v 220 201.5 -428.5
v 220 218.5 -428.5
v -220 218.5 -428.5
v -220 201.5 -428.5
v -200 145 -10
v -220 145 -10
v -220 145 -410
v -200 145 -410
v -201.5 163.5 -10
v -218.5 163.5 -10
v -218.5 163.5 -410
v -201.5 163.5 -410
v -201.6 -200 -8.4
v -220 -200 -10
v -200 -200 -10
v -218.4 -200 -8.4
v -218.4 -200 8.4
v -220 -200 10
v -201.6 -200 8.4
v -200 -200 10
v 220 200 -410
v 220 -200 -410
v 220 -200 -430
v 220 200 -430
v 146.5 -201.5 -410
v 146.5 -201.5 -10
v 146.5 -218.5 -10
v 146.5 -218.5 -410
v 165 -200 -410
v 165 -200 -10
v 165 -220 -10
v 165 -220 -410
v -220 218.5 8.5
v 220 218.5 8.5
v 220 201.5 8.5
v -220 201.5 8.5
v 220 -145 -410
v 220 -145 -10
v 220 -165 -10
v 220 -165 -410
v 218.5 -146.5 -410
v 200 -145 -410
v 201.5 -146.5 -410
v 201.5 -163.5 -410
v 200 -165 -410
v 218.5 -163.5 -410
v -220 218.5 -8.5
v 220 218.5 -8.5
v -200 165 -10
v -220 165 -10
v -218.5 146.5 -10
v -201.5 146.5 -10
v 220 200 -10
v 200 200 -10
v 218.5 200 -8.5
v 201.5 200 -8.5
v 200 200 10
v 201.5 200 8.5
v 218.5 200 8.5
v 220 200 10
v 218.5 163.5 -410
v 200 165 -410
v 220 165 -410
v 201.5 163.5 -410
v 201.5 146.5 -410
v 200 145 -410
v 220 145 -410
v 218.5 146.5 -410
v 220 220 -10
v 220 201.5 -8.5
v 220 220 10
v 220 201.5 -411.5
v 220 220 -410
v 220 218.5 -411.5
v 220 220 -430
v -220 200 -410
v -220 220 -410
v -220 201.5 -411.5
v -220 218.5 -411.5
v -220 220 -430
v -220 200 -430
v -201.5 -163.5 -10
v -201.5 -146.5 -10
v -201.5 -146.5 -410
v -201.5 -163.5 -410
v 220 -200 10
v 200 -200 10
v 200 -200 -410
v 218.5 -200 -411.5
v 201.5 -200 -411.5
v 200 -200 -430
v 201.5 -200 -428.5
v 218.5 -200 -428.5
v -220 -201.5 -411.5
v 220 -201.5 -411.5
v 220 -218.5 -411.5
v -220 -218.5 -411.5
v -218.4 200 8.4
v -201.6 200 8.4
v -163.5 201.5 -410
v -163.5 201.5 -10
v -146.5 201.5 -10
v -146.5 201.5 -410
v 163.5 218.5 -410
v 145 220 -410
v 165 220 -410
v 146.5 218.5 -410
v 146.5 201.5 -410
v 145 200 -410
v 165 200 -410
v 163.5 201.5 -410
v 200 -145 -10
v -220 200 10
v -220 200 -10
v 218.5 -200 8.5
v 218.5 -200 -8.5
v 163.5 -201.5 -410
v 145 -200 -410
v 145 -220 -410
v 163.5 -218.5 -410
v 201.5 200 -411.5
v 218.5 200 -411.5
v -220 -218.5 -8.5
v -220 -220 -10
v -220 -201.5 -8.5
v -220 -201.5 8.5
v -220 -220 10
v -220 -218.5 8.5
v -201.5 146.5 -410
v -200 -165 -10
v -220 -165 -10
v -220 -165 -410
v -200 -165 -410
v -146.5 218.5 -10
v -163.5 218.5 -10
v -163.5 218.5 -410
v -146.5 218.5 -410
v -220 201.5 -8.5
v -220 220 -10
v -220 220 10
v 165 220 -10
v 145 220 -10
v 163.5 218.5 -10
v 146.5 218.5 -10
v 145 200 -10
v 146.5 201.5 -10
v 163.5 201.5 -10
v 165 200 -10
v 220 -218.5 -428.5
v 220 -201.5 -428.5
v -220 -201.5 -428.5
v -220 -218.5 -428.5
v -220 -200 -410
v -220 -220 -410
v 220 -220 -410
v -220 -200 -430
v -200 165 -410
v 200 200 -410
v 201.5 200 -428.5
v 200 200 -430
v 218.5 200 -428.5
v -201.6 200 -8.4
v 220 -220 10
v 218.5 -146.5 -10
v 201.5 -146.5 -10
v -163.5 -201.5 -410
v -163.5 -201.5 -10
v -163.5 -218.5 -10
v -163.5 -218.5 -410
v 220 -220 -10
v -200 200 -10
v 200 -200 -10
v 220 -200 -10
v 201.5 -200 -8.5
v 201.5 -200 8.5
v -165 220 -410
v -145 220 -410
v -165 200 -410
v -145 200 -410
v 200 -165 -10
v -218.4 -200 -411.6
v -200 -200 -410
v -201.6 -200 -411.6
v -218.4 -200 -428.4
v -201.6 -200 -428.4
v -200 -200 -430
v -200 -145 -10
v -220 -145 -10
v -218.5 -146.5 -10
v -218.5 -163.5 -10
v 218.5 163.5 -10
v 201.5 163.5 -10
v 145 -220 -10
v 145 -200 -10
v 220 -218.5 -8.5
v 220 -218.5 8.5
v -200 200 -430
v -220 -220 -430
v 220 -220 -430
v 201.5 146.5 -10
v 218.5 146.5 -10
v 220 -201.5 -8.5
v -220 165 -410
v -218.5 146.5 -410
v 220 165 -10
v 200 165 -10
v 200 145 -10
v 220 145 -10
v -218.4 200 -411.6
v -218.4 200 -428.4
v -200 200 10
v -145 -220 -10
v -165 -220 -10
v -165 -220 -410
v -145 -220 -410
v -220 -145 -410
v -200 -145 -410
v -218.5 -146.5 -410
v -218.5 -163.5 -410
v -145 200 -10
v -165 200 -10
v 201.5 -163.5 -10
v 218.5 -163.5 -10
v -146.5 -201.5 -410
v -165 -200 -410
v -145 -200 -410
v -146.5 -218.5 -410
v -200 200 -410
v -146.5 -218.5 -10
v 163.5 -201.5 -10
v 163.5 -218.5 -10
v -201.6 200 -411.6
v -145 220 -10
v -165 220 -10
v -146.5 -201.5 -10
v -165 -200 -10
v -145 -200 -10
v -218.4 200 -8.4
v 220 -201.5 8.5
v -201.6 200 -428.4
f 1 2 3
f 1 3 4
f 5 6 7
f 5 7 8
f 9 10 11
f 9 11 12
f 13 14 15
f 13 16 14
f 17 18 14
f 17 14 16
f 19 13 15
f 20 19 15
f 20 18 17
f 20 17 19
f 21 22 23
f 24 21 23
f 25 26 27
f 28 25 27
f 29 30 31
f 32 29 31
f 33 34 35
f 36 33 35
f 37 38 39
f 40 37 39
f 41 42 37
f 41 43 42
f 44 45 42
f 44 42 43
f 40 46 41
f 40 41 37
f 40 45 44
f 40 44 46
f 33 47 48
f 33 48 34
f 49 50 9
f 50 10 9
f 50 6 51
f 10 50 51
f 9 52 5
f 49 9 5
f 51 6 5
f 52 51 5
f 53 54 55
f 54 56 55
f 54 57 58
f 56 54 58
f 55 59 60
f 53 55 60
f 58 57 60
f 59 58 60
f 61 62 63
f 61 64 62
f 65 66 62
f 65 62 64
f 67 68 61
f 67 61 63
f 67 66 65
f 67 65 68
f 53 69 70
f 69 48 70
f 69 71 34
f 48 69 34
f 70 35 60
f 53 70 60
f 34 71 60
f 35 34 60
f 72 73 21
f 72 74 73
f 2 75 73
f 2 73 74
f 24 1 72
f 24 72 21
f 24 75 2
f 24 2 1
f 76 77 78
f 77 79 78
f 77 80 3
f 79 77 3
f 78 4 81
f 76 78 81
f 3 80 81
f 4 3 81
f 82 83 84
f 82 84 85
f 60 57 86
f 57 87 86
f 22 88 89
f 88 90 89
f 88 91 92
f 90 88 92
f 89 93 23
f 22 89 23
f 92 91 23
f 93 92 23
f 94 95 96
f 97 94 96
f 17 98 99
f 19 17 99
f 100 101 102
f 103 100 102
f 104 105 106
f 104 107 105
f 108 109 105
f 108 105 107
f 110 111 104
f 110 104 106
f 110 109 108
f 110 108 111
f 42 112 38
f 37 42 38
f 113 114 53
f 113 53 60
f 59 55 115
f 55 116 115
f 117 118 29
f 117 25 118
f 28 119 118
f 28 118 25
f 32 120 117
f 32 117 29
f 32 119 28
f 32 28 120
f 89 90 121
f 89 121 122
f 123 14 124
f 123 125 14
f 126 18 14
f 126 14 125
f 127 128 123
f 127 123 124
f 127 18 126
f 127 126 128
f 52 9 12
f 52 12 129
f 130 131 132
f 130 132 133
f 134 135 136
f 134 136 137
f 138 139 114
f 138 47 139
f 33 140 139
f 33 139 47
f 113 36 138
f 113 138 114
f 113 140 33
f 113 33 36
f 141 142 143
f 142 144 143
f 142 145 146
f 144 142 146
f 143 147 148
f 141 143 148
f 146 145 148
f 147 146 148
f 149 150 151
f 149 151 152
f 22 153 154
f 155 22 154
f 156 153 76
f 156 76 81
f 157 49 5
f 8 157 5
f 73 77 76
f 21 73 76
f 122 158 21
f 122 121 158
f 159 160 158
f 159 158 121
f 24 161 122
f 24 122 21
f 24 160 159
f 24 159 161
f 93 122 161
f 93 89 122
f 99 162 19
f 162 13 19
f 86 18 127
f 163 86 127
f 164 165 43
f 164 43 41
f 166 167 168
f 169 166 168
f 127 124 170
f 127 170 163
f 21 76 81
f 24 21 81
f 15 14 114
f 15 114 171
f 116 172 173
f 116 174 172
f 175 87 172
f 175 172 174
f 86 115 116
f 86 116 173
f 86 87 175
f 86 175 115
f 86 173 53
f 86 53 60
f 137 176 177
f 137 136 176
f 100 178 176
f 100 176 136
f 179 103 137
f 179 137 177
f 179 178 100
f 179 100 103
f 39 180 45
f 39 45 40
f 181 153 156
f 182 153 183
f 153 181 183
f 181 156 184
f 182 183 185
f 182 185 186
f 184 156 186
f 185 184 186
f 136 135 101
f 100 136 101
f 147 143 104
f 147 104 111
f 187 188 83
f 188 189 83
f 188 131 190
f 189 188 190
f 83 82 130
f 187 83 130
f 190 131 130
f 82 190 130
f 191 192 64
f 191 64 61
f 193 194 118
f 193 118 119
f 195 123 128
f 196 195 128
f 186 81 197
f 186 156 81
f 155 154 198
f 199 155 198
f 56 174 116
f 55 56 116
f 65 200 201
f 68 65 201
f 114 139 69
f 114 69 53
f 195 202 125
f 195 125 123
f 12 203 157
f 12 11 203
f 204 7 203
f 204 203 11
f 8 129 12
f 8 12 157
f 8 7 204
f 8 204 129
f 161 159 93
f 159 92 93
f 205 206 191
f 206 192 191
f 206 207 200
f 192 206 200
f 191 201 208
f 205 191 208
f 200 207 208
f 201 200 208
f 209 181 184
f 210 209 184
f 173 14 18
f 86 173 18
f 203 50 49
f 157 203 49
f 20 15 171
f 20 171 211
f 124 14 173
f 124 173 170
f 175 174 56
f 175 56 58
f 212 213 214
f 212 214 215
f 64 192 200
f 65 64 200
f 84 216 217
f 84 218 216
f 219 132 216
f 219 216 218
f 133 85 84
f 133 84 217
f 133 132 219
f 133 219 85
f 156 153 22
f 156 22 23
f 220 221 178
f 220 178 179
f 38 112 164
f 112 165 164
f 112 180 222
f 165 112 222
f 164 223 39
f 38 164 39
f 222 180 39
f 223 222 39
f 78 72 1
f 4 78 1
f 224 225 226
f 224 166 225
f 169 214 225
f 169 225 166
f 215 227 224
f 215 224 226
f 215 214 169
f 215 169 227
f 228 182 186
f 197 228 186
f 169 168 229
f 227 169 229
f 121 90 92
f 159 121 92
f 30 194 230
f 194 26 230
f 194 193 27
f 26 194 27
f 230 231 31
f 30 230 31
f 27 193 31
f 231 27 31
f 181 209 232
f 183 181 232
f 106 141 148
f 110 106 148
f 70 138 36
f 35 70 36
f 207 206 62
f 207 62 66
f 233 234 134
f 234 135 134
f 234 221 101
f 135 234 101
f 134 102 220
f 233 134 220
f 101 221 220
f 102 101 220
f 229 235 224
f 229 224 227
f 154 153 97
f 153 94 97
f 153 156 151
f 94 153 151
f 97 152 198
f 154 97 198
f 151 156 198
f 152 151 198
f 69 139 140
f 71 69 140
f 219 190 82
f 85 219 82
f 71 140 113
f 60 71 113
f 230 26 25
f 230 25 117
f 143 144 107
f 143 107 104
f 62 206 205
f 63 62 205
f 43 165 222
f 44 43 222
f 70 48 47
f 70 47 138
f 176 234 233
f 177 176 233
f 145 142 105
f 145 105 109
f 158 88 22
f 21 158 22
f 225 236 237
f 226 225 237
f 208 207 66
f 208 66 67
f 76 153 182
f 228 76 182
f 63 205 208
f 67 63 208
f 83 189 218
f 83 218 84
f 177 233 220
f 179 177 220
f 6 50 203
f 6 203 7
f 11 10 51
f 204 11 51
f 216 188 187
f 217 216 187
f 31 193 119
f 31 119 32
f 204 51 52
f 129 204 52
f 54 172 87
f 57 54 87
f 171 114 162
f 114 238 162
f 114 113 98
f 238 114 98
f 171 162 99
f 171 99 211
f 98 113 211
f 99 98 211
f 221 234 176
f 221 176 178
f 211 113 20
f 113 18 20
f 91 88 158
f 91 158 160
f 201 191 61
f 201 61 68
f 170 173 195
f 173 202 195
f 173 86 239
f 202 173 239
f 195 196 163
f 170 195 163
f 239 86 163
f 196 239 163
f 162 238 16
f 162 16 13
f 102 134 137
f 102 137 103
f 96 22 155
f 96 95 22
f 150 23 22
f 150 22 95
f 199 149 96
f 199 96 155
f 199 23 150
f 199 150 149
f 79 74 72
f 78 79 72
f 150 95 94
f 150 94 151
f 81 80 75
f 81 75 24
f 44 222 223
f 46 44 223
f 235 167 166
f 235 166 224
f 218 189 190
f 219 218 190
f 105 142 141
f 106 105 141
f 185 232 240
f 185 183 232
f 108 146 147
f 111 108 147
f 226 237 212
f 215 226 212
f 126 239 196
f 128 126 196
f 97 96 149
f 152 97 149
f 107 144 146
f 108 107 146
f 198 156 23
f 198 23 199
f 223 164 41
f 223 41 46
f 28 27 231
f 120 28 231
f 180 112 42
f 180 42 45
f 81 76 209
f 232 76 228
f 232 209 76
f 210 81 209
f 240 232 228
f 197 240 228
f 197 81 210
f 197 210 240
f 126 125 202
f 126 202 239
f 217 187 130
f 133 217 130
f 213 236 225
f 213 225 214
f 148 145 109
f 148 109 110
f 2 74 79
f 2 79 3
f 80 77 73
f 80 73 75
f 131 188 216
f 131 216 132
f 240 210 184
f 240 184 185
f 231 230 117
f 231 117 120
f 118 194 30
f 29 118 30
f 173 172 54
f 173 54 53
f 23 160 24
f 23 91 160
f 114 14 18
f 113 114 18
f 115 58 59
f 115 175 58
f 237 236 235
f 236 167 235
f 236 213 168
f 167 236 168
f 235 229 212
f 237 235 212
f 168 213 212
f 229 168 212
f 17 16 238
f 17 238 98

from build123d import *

# Parameters (mm, degrees)
F0_W     = 20
F0_H     = 20
F0_W_2   = 16.799999401
F0_H_2   = 16.799999401
F1_DEPTH = 200
F0_W_3   = 17
F0_H_3   = 17
F3_W     = 20
F3_H     = 20
F3_W_2   = 17
F3_H_2   = 17
F4_DEPTH = 440
F5_W     = 20
F5_H     = 20
F5_W_2   = 17
F5_H_2   = 17
F6_DEPTH = 400


with BuildPart() as f1:
    # F0 (on Front) → F1 (new body, symmetric)
    with BuildSketch(Plane.XZ):
        with Locations((-210, 0)):
            Rectangle(F0_W, F0_H)
        with Locations((-210, 0)):
            Rectangle(F0_W_2, F0_H_2, mode=Mode.SUBTRACT)
    extrude(amount=F1_DEPTH, both=True)


with BuildPart() as f1b:
    # F0 (on Front) → F1, piece 2 (new body, symmetric)
    with BuildSketch(Plane.XZ):
        with Locations((210, 0)):
            Rectangle(F0_W, F0_H)
        with Locations((210, 0)):
            Rectangle(F0_W_3, F0_H_3, mode=Mode.SUBTRACT)
    extrude(amount=F1_DEPTH, both=True)


with BuildPart() as f4:
    # F3 (on face) → F4 (new body, through all)
    with BuildSketch(Plane(origin=(-220, 0, 0), x_dir=(0, -1, 0), z_dir=(-1, 0, 0))):
        with Locations((-210, 0)):
            Rectangle(F3_W, F3_H)
        with Locations((-210, 0)):
            Rectangle(F3_W_2, F3_H_2, mode=Mode.SUBTRACT)
    extrude(amount=-F4_DEPTH)


with BuildPart() as f4b:
    # F3 (on face) → F4, piece 2 (new body, through all)
    with BuildSketch(Plane(origin=(-220, 0, 0), x_dir=(0, -1, 0), z_dir=(-1, 0, 0))):
        with Locations((210, 0)):
            Rectangle(F3_W, F3_H)
        with Locations((210, 0)):
            Rectangle(F3_W_2, F3_H_2, mode=Mode.SUBTRACT)
    extrude(amount=-F4_DEPTH)


with BuildPart() as f6:
    # F5 (on face) → F6 (new body)
    with BuildSketch(Plane(origin=(0, 0, -10), x_dir=(1, 0, 0), z_dir=(0, 0, -1))):
        with Locations((-155, 210)):
            Rectangle(F5_W, F5_H)
        with Locations((-155, 210)):
            Rectangle(F5_W_2, F5_H_2, mode=Mode.SUBTRACT)
    extrude(amount=F6_DEPTH)


with BuildPart() as f6b:
    # F5 (on face) → F6, piece 2 (new body)
    with BuildSketch(Plane(origin=(0, 0, -10), x_dir=(1, 0, 0), z_dir=(0, 0, -1))):
        with Locations((155, 210)):
            Rectangle(F5_W, F5_H)
        with Locations((155, 210)):
            Rectangle(F5_W_2, F5_H_2, mode=Mode.SUBTRACT)
    extrude(amount=F6_DEPTH)


with BuildPart() as f6c:
    # F5 (on face) → F6, piece 3 (new body)
    with BuildSketch(Plane(origin=(0, 0, -10), x_dir=(1, 0, 0), z_dir=(0, 0, -1))):
        with Locations((-155, -210)):
            Rectangle(F5_W, F5_H)
        with Locations((-155, -210)):
            Rectangle(F5_W_2, F5_H_2, mode=Mode.SUBTRACT)
    extrude(amount=F6_DEPTH)


with BuildPart() as f6d:
    # F5 (on face) → F6, piece 4 (new body)
    with BuildSketch(Plane(origin=(0, 0, -10), x_dir=(1, 0, 0), z_dir=(0, 0, -1))):
        with Locations((155, -210)):
            Rectangle(F5_W, F5_H)
        with Locations((155, -210)):
            Rectangle(F5_W_2, F5_H_2, mode=Mode.SUBTRACT)
    extrude(amount=F6_DEPTH)


with BuildPart() as f6e:
    # F5 (on face) → F6, piece 5 (new body)
    with BuildSketch(Plane(origin=(0, 0, -10), x_dir=(1, 0, 0), z_dir=(0, 0, -1))):
        with Locations((-210, 155)):
            Rectangle(F5_W, F5_H)
        with Locations((-210, 155)):
            Rectangle(F5_W_2, F5_H_2, mode=Mode.SUBTRACT)
    extrude(amount=F6_DEPTH)


with BuildPart() as f6f:
    # F5 (on face) → F6, piece 6 (new body)
    with BuildSketch(Plane(origin=(0, 0, -10), x_dir=(1, 0, 0), z_dir=(0, 0, -1))):
        with Locations((-210, -155)):
            Rectangle(F5_W, F5_H)
        with Locations((-210, -155)):
            Rectangle(F5_W_2, F5_H_2, mode=Mode.SUBTRACT)
    extrude(amount=F6_DEPTH)


with BuildPart() as f6g:
    # F5 (on face) → F6, piece 7 (new body)
    with BuildSketch(Plane(origin=(0, 0, -10), x_dir=(1, 0, 0), z_dir=(0, 0, -1))):
        with Locations((210, 155)):
            Rectangle(F5_W, F5_H)
        with Locations((210, 155)):
            Rectangle(F5_W_2, F5_H_2, mode=Mode.SUBTRACT)
    extrude(amount=F6_DEPTH)


with BuildPart() as f6h:
    # F5 (on face) → F6, piece 8 (new body)
    with BuildSketch(Plane(origin=(0, 0, -10), x_dir=(1, 0, 0), z_dir=(0, 0, -1))):
        with Locations((210, -155)):
            Rectangle(F5_W, F5_H)
        with Locations((210, -155)):
            Rectangle(F5_W_2, F5_H_2, mode=Mode.SUBTRACT)
    extrude(amount=F6_DEPTH)


with BuildPart() as f8_1:
    # F8: instance of F4b
    add(f4b.part.mirror(Plane(origin=(165, 220, -210), x_dir=(1, 0, 0), z_dir=(0, 0, -1))))


with BuildPart() as f8_2:
    # F8: instance of F1b
    add(f1b.part.mirror(Plane(origin=(165, 220, -210), x_dir=(1, 0, 0), z_dir=(0, 0, -1))))


with BuildPart() as f8_3:
    # F8: instance of F1
    add(f1.part.mirror(Plane(origin=(165, 220, -210), x_dir=(1, 0, 0), z_dir=(0, 0, -1))))


with BuildPart() as f8_4:
    # F8: instance of F4
    add(f4.part.mirror(Plane(origin=(165, 220, -210), x_dir=(1, 0, 0), z_dir=(0, 0, -1))))


solid = Compound([f1.part, f1b.part, f4.part, f4b.part, f6.part, f6b.part, f6c.part, f6d.part, f6e.part, f6f.part, f6g.part, f6h.part, f8_1.part, f8_2.part, f8_3.part, f8_4.part])
